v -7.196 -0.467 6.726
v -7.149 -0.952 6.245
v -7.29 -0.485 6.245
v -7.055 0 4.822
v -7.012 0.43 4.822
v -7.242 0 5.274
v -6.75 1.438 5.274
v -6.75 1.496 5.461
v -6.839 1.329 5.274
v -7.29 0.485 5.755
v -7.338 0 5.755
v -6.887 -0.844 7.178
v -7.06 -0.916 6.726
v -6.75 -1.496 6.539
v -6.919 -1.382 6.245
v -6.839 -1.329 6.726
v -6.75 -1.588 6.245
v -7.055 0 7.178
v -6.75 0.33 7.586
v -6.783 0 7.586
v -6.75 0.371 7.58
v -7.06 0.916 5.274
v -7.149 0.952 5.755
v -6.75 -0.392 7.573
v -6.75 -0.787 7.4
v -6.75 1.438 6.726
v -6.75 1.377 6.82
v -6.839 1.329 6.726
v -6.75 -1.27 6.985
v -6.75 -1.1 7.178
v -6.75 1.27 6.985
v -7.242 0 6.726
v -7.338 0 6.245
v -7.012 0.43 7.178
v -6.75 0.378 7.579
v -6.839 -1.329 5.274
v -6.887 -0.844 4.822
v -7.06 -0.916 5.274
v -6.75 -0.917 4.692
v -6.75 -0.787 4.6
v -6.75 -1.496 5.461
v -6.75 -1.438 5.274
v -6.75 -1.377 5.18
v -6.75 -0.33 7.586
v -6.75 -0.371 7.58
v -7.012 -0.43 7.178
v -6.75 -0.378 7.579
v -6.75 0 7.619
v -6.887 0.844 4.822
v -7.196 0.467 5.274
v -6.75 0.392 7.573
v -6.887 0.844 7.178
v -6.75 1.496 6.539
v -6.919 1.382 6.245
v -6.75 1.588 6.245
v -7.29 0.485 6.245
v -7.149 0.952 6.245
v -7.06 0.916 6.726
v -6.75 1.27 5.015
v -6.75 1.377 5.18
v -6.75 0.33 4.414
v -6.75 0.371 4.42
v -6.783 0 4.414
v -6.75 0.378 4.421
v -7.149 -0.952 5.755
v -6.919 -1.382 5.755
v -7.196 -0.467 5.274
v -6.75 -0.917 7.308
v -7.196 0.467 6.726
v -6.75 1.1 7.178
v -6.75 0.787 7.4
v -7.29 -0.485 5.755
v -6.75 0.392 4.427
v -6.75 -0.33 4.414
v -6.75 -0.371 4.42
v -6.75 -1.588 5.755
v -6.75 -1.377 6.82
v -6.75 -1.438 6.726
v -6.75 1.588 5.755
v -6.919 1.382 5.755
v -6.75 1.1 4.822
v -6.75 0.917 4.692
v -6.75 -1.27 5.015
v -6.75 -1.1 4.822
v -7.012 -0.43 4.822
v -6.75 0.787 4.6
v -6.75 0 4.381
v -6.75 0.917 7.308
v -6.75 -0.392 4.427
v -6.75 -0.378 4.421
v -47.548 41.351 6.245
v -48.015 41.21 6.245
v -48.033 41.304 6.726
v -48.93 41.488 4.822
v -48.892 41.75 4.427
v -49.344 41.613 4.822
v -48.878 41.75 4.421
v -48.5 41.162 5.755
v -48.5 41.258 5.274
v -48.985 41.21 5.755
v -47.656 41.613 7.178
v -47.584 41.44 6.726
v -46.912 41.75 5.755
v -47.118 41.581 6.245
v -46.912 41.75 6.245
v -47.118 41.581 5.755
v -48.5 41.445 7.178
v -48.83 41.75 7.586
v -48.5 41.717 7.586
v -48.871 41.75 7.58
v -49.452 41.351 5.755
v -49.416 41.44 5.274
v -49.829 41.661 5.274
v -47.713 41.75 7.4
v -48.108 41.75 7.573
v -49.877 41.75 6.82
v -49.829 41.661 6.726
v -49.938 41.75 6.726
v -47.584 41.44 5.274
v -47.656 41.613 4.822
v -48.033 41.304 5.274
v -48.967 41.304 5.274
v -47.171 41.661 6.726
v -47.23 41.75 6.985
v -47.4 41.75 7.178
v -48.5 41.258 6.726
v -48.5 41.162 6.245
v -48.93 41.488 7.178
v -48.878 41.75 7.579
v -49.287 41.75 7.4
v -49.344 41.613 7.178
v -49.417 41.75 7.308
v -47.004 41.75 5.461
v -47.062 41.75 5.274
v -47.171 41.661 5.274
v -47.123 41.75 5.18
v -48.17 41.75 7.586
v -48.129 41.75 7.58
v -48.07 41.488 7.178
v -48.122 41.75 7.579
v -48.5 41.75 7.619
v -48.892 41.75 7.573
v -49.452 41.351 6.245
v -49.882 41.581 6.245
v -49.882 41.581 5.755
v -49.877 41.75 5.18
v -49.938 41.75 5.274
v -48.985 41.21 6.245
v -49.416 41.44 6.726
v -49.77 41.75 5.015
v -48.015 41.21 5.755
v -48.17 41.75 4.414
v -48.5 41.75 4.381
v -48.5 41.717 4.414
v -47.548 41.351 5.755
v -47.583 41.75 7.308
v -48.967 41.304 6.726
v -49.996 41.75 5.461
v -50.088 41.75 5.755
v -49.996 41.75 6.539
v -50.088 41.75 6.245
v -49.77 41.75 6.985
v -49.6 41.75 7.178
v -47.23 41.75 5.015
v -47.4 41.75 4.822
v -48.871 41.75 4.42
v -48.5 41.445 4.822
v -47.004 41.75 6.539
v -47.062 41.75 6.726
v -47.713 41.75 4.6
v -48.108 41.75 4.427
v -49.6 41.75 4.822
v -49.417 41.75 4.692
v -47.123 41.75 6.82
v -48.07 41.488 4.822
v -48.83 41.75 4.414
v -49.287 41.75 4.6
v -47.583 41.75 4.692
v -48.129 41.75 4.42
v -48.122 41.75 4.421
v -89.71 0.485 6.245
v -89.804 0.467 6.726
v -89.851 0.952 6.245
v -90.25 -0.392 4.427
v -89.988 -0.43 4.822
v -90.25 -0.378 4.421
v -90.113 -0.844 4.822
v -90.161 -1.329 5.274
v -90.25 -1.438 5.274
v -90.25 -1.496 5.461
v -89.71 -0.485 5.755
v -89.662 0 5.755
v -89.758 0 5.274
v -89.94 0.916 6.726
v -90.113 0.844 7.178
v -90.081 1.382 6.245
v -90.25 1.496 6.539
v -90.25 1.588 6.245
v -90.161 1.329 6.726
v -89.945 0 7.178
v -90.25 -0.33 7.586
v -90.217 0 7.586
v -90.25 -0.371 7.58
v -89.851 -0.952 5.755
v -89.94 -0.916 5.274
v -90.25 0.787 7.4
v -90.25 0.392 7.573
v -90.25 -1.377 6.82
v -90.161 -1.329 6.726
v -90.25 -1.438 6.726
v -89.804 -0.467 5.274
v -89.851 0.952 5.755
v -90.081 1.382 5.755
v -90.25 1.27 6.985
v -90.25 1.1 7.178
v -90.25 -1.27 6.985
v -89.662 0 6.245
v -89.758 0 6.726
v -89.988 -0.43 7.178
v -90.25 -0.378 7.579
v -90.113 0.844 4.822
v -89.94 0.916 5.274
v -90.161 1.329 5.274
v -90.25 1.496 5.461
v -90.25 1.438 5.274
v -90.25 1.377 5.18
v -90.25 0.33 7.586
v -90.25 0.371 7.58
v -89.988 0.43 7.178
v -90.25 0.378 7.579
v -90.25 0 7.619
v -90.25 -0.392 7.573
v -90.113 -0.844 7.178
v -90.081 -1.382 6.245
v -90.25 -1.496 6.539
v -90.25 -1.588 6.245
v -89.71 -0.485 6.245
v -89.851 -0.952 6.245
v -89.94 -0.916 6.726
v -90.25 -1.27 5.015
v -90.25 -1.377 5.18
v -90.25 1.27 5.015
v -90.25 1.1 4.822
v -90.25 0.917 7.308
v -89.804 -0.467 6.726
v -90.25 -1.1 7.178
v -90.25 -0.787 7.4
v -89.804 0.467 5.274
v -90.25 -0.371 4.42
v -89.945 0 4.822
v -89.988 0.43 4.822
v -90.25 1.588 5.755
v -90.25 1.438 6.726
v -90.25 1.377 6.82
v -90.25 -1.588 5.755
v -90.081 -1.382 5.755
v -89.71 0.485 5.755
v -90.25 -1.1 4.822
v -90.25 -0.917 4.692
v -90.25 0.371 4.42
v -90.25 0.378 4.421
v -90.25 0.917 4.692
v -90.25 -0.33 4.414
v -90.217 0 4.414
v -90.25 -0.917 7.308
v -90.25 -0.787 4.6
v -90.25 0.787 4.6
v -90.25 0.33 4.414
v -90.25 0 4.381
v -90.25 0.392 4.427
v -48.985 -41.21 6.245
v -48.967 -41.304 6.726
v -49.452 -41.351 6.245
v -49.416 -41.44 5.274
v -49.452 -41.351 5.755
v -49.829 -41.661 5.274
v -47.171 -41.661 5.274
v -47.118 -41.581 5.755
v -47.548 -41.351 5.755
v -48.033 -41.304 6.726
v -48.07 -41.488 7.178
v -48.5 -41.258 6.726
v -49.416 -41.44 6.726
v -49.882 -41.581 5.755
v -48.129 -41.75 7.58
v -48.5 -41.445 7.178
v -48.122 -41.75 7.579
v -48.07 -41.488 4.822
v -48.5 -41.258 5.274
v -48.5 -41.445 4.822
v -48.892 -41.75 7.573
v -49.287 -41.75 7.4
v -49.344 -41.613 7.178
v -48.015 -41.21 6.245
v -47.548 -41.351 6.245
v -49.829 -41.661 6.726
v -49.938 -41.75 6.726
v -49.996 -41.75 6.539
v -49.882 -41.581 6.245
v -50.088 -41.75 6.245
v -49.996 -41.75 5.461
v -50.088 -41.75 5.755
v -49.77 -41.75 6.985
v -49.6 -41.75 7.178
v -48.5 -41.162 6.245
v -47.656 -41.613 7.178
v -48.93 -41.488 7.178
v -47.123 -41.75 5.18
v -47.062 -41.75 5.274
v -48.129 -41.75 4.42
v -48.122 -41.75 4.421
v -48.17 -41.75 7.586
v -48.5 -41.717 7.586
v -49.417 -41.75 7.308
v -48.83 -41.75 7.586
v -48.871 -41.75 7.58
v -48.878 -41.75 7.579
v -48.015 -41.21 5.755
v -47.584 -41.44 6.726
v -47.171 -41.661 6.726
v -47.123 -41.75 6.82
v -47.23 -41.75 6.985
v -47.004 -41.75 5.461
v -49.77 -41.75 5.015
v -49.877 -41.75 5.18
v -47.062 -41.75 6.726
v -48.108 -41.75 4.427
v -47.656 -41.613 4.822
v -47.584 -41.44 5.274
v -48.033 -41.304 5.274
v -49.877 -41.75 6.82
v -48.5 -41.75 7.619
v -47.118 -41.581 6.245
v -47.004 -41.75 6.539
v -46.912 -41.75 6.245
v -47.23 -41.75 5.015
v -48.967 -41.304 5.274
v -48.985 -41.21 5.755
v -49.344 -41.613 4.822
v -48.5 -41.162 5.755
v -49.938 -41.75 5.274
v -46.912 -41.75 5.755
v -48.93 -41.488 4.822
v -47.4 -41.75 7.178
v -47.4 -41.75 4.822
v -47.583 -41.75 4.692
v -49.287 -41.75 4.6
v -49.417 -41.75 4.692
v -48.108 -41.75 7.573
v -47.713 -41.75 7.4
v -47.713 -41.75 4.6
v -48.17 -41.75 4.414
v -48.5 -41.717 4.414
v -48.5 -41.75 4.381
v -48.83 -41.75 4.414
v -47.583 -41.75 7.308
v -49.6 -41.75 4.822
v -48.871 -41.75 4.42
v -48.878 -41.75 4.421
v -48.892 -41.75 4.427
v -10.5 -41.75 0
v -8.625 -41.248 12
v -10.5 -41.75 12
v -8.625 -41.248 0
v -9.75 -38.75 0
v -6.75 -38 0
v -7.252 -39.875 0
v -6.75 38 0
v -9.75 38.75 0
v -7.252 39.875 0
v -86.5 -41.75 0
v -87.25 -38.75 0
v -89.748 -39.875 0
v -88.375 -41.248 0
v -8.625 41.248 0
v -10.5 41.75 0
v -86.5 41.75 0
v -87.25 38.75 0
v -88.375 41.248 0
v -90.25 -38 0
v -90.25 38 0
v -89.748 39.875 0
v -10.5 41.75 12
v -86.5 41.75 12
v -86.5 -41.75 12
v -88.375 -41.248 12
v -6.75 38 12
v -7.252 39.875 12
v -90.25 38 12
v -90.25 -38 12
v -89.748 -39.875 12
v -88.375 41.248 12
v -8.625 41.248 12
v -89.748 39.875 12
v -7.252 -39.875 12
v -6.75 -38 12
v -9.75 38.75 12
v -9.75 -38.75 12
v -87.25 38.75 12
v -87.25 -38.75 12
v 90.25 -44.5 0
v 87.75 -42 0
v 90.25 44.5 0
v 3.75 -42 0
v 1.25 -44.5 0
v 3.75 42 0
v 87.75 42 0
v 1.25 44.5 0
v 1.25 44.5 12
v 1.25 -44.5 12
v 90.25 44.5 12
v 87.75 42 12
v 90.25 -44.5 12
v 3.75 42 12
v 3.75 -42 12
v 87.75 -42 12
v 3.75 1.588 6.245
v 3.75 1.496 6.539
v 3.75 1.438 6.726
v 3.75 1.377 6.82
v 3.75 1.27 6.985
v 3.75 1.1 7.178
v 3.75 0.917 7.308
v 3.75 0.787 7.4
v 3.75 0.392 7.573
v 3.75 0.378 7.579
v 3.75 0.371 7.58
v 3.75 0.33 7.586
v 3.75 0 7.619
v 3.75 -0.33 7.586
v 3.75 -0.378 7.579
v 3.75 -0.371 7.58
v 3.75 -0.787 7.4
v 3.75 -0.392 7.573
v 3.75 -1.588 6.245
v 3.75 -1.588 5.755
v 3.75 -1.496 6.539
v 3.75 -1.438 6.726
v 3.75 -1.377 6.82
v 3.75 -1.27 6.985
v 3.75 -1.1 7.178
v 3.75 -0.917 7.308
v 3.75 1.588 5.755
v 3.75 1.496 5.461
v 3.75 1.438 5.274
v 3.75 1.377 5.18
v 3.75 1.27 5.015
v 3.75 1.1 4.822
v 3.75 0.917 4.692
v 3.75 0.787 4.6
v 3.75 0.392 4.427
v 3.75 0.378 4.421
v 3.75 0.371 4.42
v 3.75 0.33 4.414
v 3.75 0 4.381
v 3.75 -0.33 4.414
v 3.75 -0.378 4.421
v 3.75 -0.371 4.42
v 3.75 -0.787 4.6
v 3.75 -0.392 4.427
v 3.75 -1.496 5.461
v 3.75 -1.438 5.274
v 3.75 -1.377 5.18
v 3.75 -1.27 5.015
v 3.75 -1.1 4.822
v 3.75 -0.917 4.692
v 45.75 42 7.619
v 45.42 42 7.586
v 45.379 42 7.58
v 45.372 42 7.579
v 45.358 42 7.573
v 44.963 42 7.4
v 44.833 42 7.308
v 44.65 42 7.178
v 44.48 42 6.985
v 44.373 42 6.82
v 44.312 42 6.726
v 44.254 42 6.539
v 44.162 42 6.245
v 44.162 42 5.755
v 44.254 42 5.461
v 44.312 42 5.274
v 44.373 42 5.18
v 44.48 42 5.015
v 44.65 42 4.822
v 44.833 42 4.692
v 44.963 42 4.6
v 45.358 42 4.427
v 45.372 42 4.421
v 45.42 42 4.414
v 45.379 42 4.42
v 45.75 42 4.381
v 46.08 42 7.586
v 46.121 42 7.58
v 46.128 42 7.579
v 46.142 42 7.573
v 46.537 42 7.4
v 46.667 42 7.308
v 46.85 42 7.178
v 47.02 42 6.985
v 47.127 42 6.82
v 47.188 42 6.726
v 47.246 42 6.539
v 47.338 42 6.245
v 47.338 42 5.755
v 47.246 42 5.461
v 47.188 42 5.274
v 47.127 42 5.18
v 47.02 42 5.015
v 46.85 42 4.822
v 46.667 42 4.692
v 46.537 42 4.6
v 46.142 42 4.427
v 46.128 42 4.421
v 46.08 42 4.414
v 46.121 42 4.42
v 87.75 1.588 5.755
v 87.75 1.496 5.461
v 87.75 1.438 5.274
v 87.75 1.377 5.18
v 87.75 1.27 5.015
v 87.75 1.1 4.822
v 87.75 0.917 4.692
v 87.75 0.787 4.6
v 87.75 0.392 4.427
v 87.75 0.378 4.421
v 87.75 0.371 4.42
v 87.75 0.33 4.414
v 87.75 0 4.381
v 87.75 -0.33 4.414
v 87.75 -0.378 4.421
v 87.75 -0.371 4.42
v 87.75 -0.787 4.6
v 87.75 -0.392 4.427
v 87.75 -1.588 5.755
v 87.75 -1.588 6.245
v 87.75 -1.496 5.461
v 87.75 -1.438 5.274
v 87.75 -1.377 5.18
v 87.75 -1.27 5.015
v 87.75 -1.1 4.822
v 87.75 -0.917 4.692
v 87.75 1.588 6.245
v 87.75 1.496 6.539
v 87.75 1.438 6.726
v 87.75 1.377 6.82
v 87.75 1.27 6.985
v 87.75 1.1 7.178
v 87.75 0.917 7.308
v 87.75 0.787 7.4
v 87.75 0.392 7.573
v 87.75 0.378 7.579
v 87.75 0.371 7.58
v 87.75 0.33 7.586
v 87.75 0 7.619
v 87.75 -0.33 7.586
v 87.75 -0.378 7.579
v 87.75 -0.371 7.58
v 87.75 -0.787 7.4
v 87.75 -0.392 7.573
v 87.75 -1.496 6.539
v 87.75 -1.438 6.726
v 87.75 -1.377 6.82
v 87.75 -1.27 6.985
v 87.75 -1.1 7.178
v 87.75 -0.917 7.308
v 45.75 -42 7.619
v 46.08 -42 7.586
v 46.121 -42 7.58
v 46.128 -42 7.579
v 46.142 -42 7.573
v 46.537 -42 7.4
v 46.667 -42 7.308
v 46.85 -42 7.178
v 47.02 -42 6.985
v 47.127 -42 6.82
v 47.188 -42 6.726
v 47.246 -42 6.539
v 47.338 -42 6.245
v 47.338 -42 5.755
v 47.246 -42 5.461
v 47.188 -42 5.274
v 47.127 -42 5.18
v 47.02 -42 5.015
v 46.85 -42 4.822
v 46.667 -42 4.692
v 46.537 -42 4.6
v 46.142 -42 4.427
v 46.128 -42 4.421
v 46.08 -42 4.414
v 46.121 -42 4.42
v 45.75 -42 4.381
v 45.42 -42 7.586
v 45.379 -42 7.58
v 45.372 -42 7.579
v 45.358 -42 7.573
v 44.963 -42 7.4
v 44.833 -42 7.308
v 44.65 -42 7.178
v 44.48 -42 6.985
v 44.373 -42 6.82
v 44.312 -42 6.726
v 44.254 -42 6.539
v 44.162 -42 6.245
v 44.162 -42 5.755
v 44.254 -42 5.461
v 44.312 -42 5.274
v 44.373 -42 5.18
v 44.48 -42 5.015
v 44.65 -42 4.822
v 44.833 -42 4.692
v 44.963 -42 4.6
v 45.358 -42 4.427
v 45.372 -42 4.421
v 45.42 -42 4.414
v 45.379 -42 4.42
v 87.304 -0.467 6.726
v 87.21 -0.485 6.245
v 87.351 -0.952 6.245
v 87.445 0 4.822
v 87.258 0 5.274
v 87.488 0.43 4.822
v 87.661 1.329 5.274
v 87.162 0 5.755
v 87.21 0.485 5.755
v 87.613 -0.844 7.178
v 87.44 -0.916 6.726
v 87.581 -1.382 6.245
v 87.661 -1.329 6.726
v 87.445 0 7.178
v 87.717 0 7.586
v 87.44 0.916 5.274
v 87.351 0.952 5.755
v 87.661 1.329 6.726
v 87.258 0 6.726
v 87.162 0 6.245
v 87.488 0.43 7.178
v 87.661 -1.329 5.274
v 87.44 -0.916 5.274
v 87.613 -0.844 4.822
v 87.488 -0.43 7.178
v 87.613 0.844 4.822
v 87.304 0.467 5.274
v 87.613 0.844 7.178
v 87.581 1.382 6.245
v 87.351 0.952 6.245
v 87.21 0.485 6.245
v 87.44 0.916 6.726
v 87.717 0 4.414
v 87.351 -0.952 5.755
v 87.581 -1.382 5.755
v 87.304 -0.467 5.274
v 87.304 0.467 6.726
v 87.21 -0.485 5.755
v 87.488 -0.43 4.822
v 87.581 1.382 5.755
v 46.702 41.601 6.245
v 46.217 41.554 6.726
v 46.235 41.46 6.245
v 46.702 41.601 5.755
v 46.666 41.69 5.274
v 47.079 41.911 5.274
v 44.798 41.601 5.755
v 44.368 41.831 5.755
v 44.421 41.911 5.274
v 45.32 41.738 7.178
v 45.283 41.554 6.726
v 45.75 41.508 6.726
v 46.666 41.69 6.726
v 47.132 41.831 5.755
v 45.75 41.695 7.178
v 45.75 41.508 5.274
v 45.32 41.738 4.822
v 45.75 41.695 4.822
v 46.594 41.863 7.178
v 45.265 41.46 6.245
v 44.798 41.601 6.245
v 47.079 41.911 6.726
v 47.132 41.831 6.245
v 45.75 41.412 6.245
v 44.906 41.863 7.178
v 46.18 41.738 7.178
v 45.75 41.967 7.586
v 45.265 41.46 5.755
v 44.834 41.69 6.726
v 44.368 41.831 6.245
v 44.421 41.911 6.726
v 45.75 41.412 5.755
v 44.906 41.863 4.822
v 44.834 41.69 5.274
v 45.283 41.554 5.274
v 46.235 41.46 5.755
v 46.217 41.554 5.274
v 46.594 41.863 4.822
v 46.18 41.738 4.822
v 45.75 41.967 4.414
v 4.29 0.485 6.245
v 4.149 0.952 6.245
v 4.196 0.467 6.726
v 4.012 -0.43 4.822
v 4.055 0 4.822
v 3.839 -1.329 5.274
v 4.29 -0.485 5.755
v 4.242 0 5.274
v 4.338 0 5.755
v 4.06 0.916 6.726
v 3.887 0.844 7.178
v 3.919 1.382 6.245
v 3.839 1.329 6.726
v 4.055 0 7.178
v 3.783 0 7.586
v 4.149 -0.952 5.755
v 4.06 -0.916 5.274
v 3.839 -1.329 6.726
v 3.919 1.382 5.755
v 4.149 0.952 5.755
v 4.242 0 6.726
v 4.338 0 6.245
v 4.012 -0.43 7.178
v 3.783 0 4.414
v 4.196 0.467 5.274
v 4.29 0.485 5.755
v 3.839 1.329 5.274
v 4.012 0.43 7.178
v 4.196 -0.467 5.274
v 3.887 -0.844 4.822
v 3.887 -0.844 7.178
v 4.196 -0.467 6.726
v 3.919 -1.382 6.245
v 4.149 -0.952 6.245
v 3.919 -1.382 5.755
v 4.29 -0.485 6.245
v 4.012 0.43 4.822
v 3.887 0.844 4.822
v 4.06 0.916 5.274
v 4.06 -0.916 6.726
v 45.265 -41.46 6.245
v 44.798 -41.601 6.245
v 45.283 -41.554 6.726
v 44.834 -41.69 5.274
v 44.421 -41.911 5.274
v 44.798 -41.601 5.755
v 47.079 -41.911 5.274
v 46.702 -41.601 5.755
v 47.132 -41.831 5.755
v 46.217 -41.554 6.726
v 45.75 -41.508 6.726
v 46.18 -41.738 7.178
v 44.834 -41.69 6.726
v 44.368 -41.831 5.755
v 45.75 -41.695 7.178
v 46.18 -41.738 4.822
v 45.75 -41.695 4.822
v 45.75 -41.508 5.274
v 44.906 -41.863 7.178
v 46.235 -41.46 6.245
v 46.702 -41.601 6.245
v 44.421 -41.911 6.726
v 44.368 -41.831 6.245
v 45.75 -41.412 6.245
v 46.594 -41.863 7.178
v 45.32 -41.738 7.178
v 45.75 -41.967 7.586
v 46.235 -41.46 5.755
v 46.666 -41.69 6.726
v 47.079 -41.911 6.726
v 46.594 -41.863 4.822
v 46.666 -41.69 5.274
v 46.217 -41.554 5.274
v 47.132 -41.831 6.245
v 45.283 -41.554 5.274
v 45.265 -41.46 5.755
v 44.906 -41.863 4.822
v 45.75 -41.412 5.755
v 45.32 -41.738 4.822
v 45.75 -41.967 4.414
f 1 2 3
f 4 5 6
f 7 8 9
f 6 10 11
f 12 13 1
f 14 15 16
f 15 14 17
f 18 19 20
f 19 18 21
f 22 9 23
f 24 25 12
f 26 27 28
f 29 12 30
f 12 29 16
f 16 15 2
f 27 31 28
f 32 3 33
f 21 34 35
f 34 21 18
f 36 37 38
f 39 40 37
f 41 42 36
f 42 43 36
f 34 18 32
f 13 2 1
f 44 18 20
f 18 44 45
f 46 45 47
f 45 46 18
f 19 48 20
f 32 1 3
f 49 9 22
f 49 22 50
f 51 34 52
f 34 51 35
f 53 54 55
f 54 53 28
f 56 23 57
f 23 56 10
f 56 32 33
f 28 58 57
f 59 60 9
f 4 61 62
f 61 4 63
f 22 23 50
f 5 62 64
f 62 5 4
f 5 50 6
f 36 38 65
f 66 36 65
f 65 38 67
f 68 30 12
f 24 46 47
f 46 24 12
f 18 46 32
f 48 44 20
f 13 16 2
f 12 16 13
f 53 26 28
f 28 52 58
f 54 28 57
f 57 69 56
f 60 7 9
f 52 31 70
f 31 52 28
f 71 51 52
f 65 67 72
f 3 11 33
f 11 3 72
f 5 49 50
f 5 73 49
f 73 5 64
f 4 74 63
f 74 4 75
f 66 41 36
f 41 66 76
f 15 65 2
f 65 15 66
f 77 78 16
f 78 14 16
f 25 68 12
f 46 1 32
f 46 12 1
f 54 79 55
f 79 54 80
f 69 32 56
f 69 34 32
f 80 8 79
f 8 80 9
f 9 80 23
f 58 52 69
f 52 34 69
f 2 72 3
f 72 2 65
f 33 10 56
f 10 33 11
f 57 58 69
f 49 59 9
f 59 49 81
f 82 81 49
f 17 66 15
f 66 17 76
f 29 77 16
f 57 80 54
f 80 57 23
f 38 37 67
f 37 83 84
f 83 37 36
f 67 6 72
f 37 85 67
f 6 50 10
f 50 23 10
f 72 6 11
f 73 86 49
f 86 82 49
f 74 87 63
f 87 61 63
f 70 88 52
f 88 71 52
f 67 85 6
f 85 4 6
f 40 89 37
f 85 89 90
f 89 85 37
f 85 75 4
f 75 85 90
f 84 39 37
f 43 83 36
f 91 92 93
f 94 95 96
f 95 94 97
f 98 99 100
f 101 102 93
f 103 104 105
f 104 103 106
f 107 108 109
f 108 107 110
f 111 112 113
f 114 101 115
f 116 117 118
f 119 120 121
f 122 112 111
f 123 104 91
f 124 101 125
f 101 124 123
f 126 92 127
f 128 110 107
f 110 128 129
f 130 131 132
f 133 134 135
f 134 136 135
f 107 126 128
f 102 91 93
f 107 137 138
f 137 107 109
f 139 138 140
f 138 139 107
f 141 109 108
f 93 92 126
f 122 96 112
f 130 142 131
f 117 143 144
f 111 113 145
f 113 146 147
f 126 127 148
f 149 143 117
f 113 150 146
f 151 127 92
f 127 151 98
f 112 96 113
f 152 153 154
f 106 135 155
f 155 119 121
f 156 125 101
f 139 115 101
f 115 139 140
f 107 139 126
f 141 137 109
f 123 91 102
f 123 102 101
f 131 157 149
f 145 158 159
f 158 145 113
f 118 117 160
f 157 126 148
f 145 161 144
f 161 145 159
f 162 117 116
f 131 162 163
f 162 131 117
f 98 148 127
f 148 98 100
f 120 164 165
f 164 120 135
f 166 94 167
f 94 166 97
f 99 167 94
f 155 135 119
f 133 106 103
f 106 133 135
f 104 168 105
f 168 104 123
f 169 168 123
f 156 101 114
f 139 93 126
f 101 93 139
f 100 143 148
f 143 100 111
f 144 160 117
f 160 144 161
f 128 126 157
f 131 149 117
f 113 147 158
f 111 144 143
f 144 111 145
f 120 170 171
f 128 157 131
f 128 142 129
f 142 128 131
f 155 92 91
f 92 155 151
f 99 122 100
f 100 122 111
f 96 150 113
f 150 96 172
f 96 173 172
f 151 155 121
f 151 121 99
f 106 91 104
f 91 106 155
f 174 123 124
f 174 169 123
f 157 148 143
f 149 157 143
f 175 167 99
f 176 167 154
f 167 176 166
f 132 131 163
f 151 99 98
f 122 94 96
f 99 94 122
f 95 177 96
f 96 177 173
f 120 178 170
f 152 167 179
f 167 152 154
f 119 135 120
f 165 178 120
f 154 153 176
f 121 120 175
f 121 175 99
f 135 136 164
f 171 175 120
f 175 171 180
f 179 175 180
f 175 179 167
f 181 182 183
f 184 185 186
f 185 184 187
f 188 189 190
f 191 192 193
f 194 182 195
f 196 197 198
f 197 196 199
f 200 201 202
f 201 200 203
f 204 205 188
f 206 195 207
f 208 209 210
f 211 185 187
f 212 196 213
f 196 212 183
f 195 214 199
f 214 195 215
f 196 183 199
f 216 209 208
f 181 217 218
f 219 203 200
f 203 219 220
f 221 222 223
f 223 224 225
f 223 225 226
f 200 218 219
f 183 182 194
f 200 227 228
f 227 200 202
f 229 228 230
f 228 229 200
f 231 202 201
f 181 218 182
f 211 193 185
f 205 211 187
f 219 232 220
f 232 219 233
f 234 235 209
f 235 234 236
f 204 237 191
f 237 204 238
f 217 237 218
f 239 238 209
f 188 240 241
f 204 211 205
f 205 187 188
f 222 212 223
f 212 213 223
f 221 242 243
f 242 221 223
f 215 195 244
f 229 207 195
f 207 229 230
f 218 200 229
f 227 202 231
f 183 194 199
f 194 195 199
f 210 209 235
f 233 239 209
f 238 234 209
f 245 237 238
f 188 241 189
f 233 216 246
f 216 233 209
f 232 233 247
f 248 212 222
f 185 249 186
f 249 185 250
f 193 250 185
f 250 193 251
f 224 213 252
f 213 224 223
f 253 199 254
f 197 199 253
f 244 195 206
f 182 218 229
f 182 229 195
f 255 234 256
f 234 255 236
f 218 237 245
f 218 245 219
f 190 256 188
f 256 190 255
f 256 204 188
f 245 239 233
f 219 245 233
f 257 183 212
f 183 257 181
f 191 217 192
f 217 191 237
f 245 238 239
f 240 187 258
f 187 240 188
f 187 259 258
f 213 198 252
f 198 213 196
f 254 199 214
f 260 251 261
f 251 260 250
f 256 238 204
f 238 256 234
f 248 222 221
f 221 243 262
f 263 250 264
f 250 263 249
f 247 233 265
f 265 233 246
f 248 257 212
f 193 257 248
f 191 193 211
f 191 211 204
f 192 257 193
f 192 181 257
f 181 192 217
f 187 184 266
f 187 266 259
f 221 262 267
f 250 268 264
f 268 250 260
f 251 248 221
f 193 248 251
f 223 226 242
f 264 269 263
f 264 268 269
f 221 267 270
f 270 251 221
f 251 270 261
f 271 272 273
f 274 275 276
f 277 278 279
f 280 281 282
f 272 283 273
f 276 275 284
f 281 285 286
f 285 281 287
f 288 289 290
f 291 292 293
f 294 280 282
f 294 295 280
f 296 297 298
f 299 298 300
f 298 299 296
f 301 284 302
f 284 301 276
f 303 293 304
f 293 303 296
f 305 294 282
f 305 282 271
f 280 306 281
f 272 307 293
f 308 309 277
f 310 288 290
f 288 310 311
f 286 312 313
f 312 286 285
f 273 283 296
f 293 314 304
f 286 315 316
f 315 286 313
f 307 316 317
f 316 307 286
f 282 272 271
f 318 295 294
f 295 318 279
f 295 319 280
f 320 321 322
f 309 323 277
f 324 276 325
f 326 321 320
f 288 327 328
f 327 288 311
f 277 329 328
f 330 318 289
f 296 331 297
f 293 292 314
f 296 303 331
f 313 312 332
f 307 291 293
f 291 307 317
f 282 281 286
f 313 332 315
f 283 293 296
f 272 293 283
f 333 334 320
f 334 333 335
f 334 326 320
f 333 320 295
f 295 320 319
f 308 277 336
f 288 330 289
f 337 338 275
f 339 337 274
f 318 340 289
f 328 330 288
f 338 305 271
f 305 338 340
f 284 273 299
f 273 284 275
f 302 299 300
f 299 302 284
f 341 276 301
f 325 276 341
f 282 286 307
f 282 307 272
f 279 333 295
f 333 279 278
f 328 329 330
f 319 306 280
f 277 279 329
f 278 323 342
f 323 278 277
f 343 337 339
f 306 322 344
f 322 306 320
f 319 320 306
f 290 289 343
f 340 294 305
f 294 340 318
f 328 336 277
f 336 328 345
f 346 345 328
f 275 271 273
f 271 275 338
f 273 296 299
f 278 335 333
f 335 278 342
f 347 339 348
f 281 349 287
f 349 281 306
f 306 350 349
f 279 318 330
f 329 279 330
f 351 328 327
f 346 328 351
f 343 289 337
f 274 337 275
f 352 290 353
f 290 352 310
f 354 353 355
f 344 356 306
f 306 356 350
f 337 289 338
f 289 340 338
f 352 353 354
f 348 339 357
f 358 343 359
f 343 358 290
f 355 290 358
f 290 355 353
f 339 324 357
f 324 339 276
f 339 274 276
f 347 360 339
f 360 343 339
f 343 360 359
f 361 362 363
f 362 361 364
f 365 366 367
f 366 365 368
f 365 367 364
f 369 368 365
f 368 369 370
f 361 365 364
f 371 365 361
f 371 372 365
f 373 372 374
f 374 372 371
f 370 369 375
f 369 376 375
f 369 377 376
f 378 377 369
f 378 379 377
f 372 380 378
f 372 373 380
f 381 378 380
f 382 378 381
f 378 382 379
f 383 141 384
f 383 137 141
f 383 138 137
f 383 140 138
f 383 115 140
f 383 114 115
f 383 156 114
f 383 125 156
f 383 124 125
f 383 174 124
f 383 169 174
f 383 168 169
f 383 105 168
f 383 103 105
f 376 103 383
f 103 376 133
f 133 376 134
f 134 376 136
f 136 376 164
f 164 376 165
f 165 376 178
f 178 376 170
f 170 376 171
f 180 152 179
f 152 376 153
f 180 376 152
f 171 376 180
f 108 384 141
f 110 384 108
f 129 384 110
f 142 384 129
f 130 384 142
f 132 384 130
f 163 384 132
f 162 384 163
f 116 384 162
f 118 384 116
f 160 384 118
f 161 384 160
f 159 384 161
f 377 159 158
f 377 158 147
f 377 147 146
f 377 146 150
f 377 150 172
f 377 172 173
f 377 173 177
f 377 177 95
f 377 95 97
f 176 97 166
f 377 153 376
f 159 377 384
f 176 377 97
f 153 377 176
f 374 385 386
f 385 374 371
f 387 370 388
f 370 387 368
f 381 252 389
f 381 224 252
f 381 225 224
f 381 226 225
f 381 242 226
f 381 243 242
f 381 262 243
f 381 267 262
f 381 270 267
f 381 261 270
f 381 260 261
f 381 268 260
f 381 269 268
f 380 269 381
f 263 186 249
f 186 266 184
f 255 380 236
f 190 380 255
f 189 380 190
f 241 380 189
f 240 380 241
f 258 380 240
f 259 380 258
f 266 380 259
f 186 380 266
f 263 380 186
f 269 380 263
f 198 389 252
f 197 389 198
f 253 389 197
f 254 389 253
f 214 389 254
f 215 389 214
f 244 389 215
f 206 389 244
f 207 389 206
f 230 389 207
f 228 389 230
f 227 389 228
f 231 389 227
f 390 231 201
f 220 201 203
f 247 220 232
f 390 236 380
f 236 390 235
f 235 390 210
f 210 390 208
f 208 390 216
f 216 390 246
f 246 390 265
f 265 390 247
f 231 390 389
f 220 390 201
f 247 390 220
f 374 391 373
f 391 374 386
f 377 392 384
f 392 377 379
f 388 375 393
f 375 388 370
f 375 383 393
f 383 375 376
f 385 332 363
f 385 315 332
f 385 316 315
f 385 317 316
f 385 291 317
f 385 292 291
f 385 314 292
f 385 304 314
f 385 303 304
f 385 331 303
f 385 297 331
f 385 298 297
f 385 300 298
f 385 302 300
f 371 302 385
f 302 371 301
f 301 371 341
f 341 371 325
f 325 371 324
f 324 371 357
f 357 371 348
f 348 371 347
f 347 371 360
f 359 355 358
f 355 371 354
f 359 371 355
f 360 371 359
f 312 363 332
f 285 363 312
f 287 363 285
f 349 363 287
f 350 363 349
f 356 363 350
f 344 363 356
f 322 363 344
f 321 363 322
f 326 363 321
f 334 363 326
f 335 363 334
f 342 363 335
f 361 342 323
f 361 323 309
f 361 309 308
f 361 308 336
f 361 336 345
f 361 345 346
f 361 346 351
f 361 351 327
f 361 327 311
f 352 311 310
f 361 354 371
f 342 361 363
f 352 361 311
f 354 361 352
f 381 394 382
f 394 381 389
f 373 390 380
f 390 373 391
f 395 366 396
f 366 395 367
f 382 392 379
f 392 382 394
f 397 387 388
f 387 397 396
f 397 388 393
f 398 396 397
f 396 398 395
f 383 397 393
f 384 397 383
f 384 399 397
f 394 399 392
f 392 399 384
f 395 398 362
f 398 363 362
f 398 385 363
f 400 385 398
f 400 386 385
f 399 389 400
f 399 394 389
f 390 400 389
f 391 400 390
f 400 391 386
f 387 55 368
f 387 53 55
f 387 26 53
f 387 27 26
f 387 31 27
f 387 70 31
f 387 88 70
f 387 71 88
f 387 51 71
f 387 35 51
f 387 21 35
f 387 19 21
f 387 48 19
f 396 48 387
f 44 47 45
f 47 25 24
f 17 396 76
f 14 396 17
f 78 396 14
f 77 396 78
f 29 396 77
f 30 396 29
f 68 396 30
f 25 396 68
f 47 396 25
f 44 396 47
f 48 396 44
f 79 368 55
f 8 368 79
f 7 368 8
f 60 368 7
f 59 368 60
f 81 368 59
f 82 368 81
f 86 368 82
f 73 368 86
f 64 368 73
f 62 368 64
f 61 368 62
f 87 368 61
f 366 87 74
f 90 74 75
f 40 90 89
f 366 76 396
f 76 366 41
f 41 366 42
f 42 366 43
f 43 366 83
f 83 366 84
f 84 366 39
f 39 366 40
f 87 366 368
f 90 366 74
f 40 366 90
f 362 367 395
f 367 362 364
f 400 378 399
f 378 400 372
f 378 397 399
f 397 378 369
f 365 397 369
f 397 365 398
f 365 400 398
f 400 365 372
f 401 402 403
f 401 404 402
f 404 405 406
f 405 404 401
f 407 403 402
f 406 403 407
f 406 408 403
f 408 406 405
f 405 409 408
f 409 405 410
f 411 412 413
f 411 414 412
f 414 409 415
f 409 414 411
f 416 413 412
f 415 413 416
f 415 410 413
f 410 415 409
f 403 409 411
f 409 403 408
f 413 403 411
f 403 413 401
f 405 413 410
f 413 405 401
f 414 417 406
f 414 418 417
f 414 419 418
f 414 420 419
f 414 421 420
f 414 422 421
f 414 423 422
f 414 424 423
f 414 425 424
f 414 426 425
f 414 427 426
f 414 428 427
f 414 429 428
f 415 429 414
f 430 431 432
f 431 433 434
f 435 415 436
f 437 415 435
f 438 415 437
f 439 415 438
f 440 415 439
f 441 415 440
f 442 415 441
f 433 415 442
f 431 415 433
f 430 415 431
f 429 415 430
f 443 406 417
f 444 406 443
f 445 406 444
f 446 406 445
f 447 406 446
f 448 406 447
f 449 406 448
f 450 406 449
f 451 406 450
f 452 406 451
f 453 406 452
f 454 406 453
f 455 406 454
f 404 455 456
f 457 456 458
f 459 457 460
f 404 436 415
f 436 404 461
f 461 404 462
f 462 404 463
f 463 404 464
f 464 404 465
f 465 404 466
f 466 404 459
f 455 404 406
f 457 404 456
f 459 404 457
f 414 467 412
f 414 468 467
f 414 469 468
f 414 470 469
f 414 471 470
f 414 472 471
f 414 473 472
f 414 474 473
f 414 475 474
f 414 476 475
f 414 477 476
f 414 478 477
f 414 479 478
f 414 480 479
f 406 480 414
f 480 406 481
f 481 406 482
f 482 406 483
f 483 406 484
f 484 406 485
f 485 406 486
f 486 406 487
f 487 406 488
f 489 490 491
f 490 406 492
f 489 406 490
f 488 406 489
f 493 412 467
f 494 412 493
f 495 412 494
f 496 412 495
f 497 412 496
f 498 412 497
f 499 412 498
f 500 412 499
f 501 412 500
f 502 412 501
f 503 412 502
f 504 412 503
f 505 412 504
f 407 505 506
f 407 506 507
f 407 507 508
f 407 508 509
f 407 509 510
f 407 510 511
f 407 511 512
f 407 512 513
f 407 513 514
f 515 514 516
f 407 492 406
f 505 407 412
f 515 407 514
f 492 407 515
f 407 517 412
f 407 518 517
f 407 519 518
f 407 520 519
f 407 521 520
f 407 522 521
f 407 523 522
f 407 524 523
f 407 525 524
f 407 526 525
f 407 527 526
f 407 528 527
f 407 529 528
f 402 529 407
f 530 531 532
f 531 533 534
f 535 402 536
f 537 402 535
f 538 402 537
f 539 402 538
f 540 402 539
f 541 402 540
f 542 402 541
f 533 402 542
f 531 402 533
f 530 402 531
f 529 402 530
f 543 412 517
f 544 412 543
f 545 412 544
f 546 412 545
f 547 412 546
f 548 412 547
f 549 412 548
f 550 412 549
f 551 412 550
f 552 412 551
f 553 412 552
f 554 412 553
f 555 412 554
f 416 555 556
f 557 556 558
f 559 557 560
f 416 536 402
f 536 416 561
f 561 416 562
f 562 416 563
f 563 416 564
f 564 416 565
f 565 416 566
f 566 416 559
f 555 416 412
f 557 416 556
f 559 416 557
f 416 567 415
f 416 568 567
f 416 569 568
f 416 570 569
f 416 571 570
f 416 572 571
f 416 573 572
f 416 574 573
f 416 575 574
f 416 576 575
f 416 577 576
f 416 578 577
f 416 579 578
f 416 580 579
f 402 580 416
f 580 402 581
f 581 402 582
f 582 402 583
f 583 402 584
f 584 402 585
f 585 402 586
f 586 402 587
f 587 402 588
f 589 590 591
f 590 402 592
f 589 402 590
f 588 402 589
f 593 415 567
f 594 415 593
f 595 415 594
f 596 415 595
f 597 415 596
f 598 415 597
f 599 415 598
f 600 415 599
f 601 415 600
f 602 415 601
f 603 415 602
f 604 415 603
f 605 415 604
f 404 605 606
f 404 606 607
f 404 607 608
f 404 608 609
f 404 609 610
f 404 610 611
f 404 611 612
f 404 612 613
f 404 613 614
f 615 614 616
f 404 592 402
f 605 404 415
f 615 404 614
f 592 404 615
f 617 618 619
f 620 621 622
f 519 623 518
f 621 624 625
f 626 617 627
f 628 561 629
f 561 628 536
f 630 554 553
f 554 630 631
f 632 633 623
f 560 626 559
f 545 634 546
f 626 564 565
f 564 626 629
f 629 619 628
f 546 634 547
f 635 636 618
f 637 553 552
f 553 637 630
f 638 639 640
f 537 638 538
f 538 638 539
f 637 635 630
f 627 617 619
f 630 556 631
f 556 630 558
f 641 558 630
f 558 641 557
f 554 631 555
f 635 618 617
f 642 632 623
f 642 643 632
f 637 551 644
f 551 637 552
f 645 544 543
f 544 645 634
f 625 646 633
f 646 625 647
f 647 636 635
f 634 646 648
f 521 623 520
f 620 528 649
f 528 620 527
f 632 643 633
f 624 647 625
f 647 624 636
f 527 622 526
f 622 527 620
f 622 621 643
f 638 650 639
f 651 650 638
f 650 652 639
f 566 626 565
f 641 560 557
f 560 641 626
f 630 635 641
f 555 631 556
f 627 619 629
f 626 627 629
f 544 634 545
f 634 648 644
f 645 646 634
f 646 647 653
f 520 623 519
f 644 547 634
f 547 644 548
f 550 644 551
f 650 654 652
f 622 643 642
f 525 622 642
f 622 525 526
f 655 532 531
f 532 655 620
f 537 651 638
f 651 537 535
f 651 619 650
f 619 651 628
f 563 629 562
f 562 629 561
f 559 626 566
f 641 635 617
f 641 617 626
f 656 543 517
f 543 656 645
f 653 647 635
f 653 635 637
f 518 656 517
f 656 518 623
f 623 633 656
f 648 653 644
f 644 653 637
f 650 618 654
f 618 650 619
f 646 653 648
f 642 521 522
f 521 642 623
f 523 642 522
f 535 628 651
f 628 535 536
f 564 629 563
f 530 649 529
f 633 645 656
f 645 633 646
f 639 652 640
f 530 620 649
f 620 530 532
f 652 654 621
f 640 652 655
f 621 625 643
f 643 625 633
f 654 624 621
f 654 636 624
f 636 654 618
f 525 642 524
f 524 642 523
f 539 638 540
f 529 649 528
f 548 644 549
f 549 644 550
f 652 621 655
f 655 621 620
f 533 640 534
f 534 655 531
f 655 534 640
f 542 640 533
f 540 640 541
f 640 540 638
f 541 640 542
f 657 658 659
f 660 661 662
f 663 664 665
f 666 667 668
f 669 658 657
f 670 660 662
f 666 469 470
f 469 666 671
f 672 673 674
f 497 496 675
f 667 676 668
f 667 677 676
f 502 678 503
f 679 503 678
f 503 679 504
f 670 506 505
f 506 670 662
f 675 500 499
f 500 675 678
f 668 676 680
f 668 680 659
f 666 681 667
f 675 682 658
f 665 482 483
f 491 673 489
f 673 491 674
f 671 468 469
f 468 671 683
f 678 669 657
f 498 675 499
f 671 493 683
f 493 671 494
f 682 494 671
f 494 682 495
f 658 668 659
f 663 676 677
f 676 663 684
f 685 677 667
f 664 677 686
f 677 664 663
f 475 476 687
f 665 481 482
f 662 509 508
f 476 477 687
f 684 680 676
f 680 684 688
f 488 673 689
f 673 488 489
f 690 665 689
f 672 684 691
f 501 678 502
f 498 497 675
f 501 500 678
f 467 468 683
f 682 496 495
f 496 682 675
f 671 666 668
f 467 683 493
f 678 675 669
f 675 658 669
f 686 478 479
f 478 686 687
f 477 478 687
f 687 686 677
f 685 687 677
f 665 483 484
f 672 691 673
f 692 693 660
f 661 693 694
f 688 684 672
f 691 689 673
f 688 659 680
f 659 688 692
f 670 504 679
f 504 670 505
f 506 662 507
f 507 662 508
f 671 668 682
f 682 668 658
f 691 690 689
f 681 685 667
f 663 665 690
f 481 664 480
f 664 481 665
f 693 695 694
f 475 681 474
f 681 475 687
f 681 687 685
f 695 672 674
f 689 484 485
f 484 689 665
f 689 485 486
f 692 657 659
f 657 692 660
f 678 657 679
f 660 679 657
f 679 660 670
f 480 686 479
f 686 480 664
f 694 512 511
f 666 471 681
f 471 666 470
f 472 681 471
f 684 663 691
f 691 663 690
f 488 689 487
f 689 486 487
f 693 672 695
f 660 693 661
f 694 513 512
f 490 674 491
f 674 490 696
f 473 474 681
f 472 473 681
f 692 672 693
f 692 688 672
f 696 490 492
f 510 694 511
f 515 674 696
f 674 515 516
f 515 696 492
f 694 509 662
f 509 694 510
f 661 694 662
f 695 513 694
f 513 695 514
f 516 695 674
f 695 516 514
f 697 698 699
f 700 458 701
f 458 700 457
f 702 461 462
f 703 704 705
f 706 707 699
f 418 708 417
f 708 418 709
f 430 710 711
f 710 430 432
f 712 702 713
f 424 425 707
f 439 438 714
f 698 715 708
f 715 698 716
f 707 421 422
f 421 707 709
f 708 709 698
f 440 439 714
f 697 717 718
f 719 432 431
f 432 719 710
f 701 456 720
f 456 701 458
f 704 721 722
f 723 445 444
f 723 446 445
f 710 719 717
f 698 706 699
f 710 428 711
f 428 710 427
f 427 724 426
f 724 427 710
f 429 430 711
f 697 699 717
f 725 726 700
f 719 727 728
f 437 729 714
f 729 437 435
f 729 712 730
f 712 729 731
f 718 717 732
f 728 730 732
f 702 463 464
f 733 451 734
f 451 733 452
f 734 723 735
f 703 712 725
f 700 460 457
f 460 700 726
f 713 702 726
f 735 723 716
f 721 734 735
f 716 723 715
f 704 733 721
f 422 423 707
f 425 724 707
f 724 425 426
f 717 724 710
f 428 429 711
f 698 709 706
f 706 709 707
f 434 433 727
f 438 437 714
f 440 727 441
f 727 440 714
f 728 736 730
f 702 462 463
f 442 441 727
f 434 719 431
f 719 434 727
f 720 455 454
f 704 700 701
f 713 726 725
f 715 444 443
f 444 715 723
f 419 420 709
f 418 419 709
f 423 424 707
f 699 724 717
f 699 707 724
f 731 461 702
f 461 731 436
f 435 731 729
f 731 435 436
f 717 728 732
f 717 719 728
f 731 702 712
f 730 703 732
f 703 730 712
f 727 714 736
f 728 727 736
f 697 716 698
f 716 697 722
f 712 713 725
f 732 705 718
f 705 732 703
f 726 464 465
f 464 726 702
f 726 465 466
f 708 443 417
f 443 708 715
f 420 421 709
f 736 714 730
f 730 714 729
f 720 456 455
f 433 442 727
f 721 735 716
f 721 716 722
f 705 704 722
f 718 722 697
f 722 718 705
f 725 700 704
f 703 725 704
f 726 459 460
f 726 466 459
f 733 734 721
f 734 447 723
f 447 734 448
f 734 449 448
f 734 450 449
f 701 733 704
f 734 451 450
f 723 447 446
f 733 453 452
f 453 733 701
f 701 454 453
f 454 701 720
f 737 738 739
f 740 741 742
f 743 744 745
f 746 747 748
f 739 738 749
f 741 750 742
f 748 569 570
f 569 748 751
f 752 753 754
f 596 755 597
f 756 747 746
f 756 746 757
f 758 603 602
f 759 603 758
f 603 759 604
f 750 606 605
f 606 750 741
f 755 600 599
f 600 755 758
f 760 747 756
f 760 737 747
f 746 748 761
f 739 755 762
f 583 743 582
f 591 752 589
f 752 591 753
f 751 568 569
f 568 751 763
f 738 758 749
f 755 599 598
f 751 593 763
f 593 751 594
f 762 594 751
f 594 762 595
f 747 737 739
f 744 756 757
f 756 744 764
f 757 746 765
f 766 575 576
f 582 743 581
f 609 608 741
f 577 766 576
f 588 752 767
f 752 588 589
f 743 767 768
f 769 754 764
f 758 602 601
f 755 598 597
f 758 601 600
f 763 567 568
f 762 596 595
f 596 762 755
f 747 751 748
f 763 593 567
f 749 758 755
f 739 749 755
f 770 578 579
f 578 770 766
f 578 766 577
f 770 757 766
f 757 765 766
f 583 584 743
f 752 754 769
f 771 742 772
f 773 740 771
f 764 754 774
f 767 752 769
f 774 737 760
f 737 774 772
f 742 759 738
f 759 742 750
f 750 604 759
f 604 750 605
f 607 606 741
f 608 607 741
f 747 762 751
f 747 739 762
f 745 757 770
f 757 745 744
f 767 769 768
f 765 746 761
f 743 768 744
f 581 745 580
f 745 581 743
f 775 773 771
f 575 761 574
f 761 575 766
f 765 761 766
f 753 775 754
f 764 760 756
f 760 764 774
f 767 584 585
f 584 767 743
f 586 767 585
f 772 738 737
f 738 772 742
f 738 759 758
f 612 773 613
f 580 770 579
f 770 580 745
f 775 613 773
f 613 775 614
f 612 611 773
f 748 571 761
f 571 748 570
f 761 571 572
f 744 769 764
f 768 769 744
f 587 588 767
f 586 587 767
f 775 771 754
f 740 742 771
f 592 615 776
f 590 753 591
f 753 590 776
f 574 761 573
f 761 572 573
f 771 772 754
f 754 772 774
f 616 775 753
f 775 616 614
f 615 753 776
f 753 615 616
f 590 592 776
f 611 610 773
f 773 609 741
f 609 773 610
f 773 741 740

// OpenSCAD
// file: ../../lib/vessel.scad
// SPDX-License-Identifier: MIT
// Copyright (c) 2026 Aaron Cupp
//
// vessel.scad — parametric collar cups for bottles, cans, and pen-form tools.
//
// A collar cup is a solid Gridfinity block with cylindrical bores sunk into it.
// It LOCATES a vessel; it does not clamp one. That distinction is the whole
// design: a collar that grips harder than the bin weighs comes out of the
// baseplate with the bottle when you grab it one-handed. Clearance, not
// interference — CLR is per-diameter, not per-side.
//
// Capture depth is roughly a third of the vessel's height. Enough to resist a
// knock (this bench sits under a 180 W fume-extractor intake), not so much that
// you're fishing the bottle out.
//
//   collar_cup(nx, ny, vessel_d, capture_h, …)   — one centred bore
//   collar_cup_multi(nx, ny, bores, capture_h, …) — bores = [[x, y, d], …]
//
// Cord slot: pen-form tools that stand in a cup are usually corded (the HARDELL
// rotary tool takes a barrel jack). Without a slot the lead drapes over the rim
// and levers the tool sideways. `cord_w > 0` cuts a channel from the bore out
// through the wall, open to the top.

include <gridfinity.scad>

CLR      = 1.0;   // bore = vessel_d + CLR. Loose on purpose — see above.
MIN_WALL = 1.2;   // minimum material between two bores, and bore to outer face

// ---- geometry guards ----
// Overlapping bores and bores that break out through the side wall both still
// render as perfectly watertight, 2-manifold meshes — CI cannot tell you the
// part is wrong, only that it is closed. These asserts encode the intent that
// the mesh check can't. Cheap, and they fire at render time rather than on the
// printer.
function _pair_gaps(bores, clr) = [
    for (i = [0 : len(bores)-1], j = [0 : len(bores)-1]) if (i < j)
        norm([bores[i][0]-bores[j][0], bores[i][1]-bores[j][1]])
        - (bores[i][2]+clr)/2 - (bores[j][2]+clr)/2
];
function _edge_gaps(bores, clr, W, D) = [
    for (b = bores) min(W/2 - abs(b[0]) - (b[2]+clr)/2,
                        D/2 - abs(b[1]) - (b[2]+clr)/2)
];

// Multi-bore block. Bores are [x, y, diameter] in mm, relative to the block centre.
module collar_cup_multi(nx, ny, bores, capture_h, floor = 1.4, clr = CLR,
                        cord_w = 0, cord_at = 0, min_wall = MIN_WALL) {
    h = BIN_BASE_H + floor + capture_h;
    e = 0.1;
    W = nx*GF - 0.5; D = ny*GF - 0.5;
    _pg = _pair_gaps(bores, clr);
    _eg = _edge_gaps(bores, clr, W, D);
    assert(len(_pg) == 0 || min(_pg) >= min_wall,
           "collar_cup: bores are too close — they would merge into one pocket");
    assert(min(_eg) >= min_wall,
           "collar_cup: a bore breaches the outer wall — block needs more units");
    difference() {
        bin_blank(nx, ny, h);
        for (b = bores)
            translate([b[0], b[1], BIN_BASE_H + floor])
                cylinder(d = b[2] + clr, h = capture_h + e, $fn = 96);
        // Cord channel: from the first bore outward through the +X wall, open to
        // the rim so the lead drops in from above rather than threading.
        if (cord_w > 0)
            translate([bores[0][0], bores[0][1] - cord_w/2, BIN_BASE_H + floor + cord_at])
                cube([nx*GF, cord_w, h]);
    }
}

// Single centred bore — the common case.
module collar_cup(nx, ny, vessel_d, capture_h, floor = 1.4, clr = CLR,
                  cord_w = 0, cord_at = 0, min_wall = MIN_WALL) {
    collar_cup_multi(nx, ny, [[0, 0, vessel_d]], capture_h, floor, clr,
                     cord_w, cord_at, min_wall);
}

// Evenly spaced row of same-depth bores along X — for a rank of aerosol cans.
// Returns geometry, not a list; pass the diameters and it lays them out on the
// block's centre line.
module collar_cup_row(nx, ny, diameters, capture_h, floor = 1.4, clr = CLR,
                      min_wall = MIN_WALL) {
    n = len(diameters);
    pitch = nx * GF / n;
    collar_cup_multi(nx, ny,
        [for (i = [0 : n-1]) [(i - (n-1)/2) * pitch, 0, diameters[i]]],
        capture_h, floor, clr, 0, 0, min_wall);
}
// file: ../../lib/syringe.scad
// SPDX-License-Identifier: MIT
// Copyright (c) 2026 Aaron Cupp
//
// syringe.scad — bore-grid racks: a Gridfinity block drilled with a 2D array of
// vertical holes. Syringes, barrel tips, rotary burrs — same form, different
// numbers.
//
// This is a layout helper over collar_cup_multi(), not new geometry. The bores
// are VERTICAL: no overhangs to print, densest packing, shortest block. Tilting
// them toward the user reads better and plucks easier, but costs all three —
// revisit only if upright proves annoying in practice.
//
// Bore depth is a CAPTURE depth, not the item's length. A 125 mm syringe in a
// 35 mm bore stands like a pen in a cup; the block doesn't grow to swallow it.
//
//   bore_grid(cols, rows, d, px, py)          — position list, for composing
//   syringe_rack(nx, ny, cols, rows, d, …)    — the finished rack
//
// Auto-pitch: with pitch = nx*GF/cols and the grid centred, the margin from the
// outermost bore's centre to the block edge is exactly pitch/2 — so a single
// condition, pitch >= bore + 2*min_wall, guards BOTH inter-bore webs and the
// outer wall. That's what the assert below checks. It is not decoration: a
// plausible-looking spec (10 mm syringes, 6 across a 2-unit block) leaves a
// 0.84 mm outer wall, which you would otherwise find out about on the printer.

include <vessel.scad>

SYR_CLR      = 1.0;   // bore = syringe_d + SYR_CLR (per diameter, not per side)
SYR_MIN_WALL = 1.2;   // minimum web between bores, and bore to outer face

// Bore centres for a cols × rows grid, centred on the origin.
function bore_grid(cols, rows, d, px, py) =
    [for (c = [0 : cols-1], r = [0 : rows-1])
        [(c - (cols-1)/2) * px, (r - (rows-1)/2) * py, d]];

// Rack of identical bores. pitch_x / pitch_y default to an even spread across
// the block footprint; pass them explicitly to pack tighter and leave a margin.
module syringe_rack(nx, ny, cols, rows, syringe_d, capture_h = 35,
                    floor = 1.4, clr = SYR_CLR, min_wall = SYR_MIN_WALL,
                    pitch_x = 0, pitch_y = 0) {
    px   = pitch_x > 0 ? pitch_x : nx * GF / cols;
    py   = pitch_y > 0 ? pitch_y : ny * GF / rows;
    bore = syringe_d + clr;

    assert(px >= bore + 2 * min_wall,
           "syringe_rack: too many columns — bores would merge or breach the outer wall");
    assert(py >= bore + 2 * min_wall,
           "syringe_rack: too many rows — bores would merge or breach the outer wall");

    collar_cup_multi(nx, ny, bore_grid(cols, rows, syringe_d, px, py),
                     capture_h, floor, clr);
}
// file: ../uv_mask_common.scad
// uv_mask_common — deep-bore, capped rack for UV-curable mask syringes.
// The mask cures under 365 nm, so ambient light skins it. Syringes sit TIP-DOWN
// in deep opaque bores (tip + most of the barrel shielded); an opaque CAP covers
// the stubs that stick up. Print BOTH in opaque filament (not clear/natural).
include <../lib/syringe.scad>
UVM_D      = 18.8;   // 10 ml syringe barrel — see syringe-holders/syringe_holders_common.scad
UVM_COLS   = 3; UVM_ROWS = 3;   // 9 slots (holds 7: 2 green + 5 others)
UVM_DEPTH  = 65;     // bore depth — swallows the tip + most of a ~100 mm syringe
UVM_NX = 2; UVM_NY = 2;   // 2x1 cannot hold 8 bores at 18.8 — it fits three

/* [Cap] */
// The cap was a plain box over a plain block: 0.25 mm per side, friction only,
// nothing holding it on. For a cap whose whole job is keeping UV off the mask,
// coming off unnoticed is the failure that matters — you find out weeks later
// when the syringes have skinned. So: four detents, one centred on each wall.
//
// Point contacts, not a continuous bead. A bead has to be right everywhere at
// once and is unforgiving to tune; four bumps can be sanded back if they bind.
CAP_WALL = 2.5;   // [2:0.5:4]
CAP_TOP  = 2.0;   // [1.5:0.5:4] solid roof
CAP_CLR  = 0.5;   // [0.3:0.1:1.2] total, so half of this per side
CAP_H    = 42;    // [30:1:60] cavity depth. Stub height = syringe length - UVM_DEPTH

DET_R     = 2.5;  // [1.5:0.5:4] bump sphere radius
DET_PROUD = 0.6;  // [0.3:0.1:1.2] how far it stands into the gap.
                  //   CATCH DEPTH = DET_PROUD - CAP_CLR/2, and the bump rubs the
                  //   block by that same amount all the way down. UNVERIFIED on
                  //   this printer — print coupons/cap_detent_gauge.scad first.
DET_UP    = 6.0;  // [3:0.5:12] bump centre, measured UP from the cap's mouth

// Block height, derived — do not hardcode 71.15.
UVM_BLOCK_H = UVM_DEPTH + BIN_BASE_H + 1.4;

CAP_CAV   = UVM_NX*GF - 0.5 + CAP_CLR;     // cavity across flats
BLOCK_W   = UVM_NX*GF - 0.5;

// Detent centres. The two must agree or the cap simply will not click, so both
// are derived from the same DET_UP rather than written down twice.
CAP_DET_Z   = CAP_TOP + CAP_H - DET_UP;          // in the cap's own emitted frame
BLOCK_DET_Z = UVM_BLOCK_H - CAP_H + DET_UP;      // in the block's frame

// Male bumps for the cap, female dimples for the block: same call, different
// offset, so they cannot drift apart.
module uvm_detents(across, z, r = DET_R, proud = DET_PROUD) {
    for (a = [0, 90, 180, 270])
        rotate([0, 0, a])
            translate([across/2 + r - proud, 0, z]) sphere(r = r, $fn = 32);
}

// Cap that slides over the block top, covering the protruding syringe stubs.
//
// EMITTED TOP-DOWN, and that is the orientation to print it in: the solid 2 mm
// top lies on the bed, the walls rise from it, and the mouth faces up.
//
// Do NOT print it mouth-down. The cavity is 84 mm across, so closing the top
// last means bridging 84 mm of open air — it sags, and the sag is on the face
// that has to sit flat over the rack. An earlier version of this file emitted
// mouth-down and the README recommended it, reasoning that the sealing rim
// wants to be on the bed. The rim does print marginally crisper that way; an
// 84 mm bridge is not a trade worth making for it.
module uvm_cap() {
    W = UVM_NX*GF - 0.5; D = UVM_NY*GF - 0.5;
    clr = CAP_CLR; wall = CAP_WALL; top = CAP_TOP; h = CAP_H;
    union() {
        difference() {
            translate([-(W+2*wall)/2, -(D+2*wall)/2, 0]) cube([W+2*wall, D+2*wall, h+top]);
            // Cavity opens UPWARD: starts above the solid top, runs out through z-max.
            translate([-(W+clr)/2, -(D+clr)/2, top]) cube([W+clr, D+clr, h+0.1]);
        }
        // Bumps stand INTO the cavity. A sphere on a vertical wall is a shallow
        // overhang at this radius and prints without support.
        intersection() {
            uvm_detents(CAP_CAV, CAP_DET_Z);
            translate([-(W+clr)/2, -(D+clr)/2, top]) cube([W+clr, D+clr, h]);
        }
    }
}

// The block's matching dimples. Subtracted by bin_uv_mask.
module uvm_block_detents() { uvm_detents(BLOCK_W, BLOCK_DET_Z); }
// main file
// cap_detent_gauge — PRINT THIS BEFORE THE CAP AND THE RACK.
//
// Two short rings that reproduce the cap/block detent at full size: same
// 83.5 mm span, same wall thicknesses, same 0.25 mm per-side gap, same detent
// height above the mouth. Push one onto the other and judge the click.
//
// WHAT IT IS TESTING: not the diameter — the CATCH DEPTH.
//   catch = DET_PROUD - CAP_CLR/2  (0.60 - 0.25 = 0.35 mm at the defaults)
// and the bump rubs the block by that same amount for the whole 36 mm of
// insertion on the real part. Too deep and the cap is a fight to fit and
// scrapes; too shallow and it lifts off when you brush it. Neither has been
// verified on this printer, and the failure mode is the expensive kind — a cap
// that quietly falls off lets 365 nm at the mask and you find out weeks later.
//
// WHY FULL SPAN: the click comes from the cap wall flexing. A short test piece
// is stiffer than the real 83.5 mm wall, so it would read tighter than the part
// and send you to a value that ends up too weak. The span is the point.
//
// HOW TO USE
//   1. Print both. Any material — but if your cap will be PETG, print this in
//      PETG; the spring differs.
//   2. Push the ring onto the stub. You want a definite click, held against a
//      shake, released by a deliberate pull.
//   3. Too tight / scrapes  -> lower DET_PROUD.  Falls off -> raise it.
//      Re-render with:  openscad -D DET_PROUD=0.8 -o gauge.stl ...
//   4. Tell me the value that works and I will set it in uv_mask_common.scad.
//
// ~26 g against 384 cm³ of block and cap in opaque filament.
//
// SPDX-License-Identifier: MIT
// Copyright (c) 2026 Aaron Cupp

include <../uv_mask_common.scad>

H       = 12;    // [8:1:20] ring height — must exceed DET_UP with room to spare
STUB_W  = 3.0;   // [2:0.5:5] block-stub wall. The real block is solid; this only
                 //   has to be rigid enough not to flex, which at 83.5 mm it is.
GAP     = 8;     // [4:1:20] space between the two pieces on the bed

assert(H > DET_UP + 3, "Ring is too short to contain the detent plus a lead-in.");

// Block stub: outer face where the real block's is, dimples at DET_UP.
translate([-(BLOCK_W + GAP + CAP_CAV/1 + 2*CAP_WALL)/2 + BLOCK_W/2, 0, 0])
difference() {
    linear_extrude(H) offset(BIN_R) offset(-BIN_R) square([BLOCK_W, BLOCK_W], center = true);
    translate([0, 0, -0.1])
        linear_extrude(H + 0.2) square([BLOCK_W - 2*STUB_W, BLOCK_W - 2*STUB_W], center = true);
    uvm_detents(BLOCK_W, DET_UP);
}

// Cap ring: cavity where the real cap's is, bumps at the same height.
translate([(BLOCK_W + GAP + CAP_CAV + 2*CAP_WALL)/2 - (CAP_CAV/2 + CAP_WALL), 0, 0])
union() {
    difference() {
        linear_extrude(H) square([CAP_CAV + 2*CAP_WALL, CAP_CAV + 2*CAP_WALL], center = true);
        translate([0, 0, -0.1]) linear_extrude(H + 0.2) square([CAP_CAV, CAP_CAV], center = true);
    }
    intersection() {
        uvm_detents(CAP_CAV, DET_UP);
        linear_extrude(H) square([CAP_CAV, CAP_CAV], center = true);
    }
}
